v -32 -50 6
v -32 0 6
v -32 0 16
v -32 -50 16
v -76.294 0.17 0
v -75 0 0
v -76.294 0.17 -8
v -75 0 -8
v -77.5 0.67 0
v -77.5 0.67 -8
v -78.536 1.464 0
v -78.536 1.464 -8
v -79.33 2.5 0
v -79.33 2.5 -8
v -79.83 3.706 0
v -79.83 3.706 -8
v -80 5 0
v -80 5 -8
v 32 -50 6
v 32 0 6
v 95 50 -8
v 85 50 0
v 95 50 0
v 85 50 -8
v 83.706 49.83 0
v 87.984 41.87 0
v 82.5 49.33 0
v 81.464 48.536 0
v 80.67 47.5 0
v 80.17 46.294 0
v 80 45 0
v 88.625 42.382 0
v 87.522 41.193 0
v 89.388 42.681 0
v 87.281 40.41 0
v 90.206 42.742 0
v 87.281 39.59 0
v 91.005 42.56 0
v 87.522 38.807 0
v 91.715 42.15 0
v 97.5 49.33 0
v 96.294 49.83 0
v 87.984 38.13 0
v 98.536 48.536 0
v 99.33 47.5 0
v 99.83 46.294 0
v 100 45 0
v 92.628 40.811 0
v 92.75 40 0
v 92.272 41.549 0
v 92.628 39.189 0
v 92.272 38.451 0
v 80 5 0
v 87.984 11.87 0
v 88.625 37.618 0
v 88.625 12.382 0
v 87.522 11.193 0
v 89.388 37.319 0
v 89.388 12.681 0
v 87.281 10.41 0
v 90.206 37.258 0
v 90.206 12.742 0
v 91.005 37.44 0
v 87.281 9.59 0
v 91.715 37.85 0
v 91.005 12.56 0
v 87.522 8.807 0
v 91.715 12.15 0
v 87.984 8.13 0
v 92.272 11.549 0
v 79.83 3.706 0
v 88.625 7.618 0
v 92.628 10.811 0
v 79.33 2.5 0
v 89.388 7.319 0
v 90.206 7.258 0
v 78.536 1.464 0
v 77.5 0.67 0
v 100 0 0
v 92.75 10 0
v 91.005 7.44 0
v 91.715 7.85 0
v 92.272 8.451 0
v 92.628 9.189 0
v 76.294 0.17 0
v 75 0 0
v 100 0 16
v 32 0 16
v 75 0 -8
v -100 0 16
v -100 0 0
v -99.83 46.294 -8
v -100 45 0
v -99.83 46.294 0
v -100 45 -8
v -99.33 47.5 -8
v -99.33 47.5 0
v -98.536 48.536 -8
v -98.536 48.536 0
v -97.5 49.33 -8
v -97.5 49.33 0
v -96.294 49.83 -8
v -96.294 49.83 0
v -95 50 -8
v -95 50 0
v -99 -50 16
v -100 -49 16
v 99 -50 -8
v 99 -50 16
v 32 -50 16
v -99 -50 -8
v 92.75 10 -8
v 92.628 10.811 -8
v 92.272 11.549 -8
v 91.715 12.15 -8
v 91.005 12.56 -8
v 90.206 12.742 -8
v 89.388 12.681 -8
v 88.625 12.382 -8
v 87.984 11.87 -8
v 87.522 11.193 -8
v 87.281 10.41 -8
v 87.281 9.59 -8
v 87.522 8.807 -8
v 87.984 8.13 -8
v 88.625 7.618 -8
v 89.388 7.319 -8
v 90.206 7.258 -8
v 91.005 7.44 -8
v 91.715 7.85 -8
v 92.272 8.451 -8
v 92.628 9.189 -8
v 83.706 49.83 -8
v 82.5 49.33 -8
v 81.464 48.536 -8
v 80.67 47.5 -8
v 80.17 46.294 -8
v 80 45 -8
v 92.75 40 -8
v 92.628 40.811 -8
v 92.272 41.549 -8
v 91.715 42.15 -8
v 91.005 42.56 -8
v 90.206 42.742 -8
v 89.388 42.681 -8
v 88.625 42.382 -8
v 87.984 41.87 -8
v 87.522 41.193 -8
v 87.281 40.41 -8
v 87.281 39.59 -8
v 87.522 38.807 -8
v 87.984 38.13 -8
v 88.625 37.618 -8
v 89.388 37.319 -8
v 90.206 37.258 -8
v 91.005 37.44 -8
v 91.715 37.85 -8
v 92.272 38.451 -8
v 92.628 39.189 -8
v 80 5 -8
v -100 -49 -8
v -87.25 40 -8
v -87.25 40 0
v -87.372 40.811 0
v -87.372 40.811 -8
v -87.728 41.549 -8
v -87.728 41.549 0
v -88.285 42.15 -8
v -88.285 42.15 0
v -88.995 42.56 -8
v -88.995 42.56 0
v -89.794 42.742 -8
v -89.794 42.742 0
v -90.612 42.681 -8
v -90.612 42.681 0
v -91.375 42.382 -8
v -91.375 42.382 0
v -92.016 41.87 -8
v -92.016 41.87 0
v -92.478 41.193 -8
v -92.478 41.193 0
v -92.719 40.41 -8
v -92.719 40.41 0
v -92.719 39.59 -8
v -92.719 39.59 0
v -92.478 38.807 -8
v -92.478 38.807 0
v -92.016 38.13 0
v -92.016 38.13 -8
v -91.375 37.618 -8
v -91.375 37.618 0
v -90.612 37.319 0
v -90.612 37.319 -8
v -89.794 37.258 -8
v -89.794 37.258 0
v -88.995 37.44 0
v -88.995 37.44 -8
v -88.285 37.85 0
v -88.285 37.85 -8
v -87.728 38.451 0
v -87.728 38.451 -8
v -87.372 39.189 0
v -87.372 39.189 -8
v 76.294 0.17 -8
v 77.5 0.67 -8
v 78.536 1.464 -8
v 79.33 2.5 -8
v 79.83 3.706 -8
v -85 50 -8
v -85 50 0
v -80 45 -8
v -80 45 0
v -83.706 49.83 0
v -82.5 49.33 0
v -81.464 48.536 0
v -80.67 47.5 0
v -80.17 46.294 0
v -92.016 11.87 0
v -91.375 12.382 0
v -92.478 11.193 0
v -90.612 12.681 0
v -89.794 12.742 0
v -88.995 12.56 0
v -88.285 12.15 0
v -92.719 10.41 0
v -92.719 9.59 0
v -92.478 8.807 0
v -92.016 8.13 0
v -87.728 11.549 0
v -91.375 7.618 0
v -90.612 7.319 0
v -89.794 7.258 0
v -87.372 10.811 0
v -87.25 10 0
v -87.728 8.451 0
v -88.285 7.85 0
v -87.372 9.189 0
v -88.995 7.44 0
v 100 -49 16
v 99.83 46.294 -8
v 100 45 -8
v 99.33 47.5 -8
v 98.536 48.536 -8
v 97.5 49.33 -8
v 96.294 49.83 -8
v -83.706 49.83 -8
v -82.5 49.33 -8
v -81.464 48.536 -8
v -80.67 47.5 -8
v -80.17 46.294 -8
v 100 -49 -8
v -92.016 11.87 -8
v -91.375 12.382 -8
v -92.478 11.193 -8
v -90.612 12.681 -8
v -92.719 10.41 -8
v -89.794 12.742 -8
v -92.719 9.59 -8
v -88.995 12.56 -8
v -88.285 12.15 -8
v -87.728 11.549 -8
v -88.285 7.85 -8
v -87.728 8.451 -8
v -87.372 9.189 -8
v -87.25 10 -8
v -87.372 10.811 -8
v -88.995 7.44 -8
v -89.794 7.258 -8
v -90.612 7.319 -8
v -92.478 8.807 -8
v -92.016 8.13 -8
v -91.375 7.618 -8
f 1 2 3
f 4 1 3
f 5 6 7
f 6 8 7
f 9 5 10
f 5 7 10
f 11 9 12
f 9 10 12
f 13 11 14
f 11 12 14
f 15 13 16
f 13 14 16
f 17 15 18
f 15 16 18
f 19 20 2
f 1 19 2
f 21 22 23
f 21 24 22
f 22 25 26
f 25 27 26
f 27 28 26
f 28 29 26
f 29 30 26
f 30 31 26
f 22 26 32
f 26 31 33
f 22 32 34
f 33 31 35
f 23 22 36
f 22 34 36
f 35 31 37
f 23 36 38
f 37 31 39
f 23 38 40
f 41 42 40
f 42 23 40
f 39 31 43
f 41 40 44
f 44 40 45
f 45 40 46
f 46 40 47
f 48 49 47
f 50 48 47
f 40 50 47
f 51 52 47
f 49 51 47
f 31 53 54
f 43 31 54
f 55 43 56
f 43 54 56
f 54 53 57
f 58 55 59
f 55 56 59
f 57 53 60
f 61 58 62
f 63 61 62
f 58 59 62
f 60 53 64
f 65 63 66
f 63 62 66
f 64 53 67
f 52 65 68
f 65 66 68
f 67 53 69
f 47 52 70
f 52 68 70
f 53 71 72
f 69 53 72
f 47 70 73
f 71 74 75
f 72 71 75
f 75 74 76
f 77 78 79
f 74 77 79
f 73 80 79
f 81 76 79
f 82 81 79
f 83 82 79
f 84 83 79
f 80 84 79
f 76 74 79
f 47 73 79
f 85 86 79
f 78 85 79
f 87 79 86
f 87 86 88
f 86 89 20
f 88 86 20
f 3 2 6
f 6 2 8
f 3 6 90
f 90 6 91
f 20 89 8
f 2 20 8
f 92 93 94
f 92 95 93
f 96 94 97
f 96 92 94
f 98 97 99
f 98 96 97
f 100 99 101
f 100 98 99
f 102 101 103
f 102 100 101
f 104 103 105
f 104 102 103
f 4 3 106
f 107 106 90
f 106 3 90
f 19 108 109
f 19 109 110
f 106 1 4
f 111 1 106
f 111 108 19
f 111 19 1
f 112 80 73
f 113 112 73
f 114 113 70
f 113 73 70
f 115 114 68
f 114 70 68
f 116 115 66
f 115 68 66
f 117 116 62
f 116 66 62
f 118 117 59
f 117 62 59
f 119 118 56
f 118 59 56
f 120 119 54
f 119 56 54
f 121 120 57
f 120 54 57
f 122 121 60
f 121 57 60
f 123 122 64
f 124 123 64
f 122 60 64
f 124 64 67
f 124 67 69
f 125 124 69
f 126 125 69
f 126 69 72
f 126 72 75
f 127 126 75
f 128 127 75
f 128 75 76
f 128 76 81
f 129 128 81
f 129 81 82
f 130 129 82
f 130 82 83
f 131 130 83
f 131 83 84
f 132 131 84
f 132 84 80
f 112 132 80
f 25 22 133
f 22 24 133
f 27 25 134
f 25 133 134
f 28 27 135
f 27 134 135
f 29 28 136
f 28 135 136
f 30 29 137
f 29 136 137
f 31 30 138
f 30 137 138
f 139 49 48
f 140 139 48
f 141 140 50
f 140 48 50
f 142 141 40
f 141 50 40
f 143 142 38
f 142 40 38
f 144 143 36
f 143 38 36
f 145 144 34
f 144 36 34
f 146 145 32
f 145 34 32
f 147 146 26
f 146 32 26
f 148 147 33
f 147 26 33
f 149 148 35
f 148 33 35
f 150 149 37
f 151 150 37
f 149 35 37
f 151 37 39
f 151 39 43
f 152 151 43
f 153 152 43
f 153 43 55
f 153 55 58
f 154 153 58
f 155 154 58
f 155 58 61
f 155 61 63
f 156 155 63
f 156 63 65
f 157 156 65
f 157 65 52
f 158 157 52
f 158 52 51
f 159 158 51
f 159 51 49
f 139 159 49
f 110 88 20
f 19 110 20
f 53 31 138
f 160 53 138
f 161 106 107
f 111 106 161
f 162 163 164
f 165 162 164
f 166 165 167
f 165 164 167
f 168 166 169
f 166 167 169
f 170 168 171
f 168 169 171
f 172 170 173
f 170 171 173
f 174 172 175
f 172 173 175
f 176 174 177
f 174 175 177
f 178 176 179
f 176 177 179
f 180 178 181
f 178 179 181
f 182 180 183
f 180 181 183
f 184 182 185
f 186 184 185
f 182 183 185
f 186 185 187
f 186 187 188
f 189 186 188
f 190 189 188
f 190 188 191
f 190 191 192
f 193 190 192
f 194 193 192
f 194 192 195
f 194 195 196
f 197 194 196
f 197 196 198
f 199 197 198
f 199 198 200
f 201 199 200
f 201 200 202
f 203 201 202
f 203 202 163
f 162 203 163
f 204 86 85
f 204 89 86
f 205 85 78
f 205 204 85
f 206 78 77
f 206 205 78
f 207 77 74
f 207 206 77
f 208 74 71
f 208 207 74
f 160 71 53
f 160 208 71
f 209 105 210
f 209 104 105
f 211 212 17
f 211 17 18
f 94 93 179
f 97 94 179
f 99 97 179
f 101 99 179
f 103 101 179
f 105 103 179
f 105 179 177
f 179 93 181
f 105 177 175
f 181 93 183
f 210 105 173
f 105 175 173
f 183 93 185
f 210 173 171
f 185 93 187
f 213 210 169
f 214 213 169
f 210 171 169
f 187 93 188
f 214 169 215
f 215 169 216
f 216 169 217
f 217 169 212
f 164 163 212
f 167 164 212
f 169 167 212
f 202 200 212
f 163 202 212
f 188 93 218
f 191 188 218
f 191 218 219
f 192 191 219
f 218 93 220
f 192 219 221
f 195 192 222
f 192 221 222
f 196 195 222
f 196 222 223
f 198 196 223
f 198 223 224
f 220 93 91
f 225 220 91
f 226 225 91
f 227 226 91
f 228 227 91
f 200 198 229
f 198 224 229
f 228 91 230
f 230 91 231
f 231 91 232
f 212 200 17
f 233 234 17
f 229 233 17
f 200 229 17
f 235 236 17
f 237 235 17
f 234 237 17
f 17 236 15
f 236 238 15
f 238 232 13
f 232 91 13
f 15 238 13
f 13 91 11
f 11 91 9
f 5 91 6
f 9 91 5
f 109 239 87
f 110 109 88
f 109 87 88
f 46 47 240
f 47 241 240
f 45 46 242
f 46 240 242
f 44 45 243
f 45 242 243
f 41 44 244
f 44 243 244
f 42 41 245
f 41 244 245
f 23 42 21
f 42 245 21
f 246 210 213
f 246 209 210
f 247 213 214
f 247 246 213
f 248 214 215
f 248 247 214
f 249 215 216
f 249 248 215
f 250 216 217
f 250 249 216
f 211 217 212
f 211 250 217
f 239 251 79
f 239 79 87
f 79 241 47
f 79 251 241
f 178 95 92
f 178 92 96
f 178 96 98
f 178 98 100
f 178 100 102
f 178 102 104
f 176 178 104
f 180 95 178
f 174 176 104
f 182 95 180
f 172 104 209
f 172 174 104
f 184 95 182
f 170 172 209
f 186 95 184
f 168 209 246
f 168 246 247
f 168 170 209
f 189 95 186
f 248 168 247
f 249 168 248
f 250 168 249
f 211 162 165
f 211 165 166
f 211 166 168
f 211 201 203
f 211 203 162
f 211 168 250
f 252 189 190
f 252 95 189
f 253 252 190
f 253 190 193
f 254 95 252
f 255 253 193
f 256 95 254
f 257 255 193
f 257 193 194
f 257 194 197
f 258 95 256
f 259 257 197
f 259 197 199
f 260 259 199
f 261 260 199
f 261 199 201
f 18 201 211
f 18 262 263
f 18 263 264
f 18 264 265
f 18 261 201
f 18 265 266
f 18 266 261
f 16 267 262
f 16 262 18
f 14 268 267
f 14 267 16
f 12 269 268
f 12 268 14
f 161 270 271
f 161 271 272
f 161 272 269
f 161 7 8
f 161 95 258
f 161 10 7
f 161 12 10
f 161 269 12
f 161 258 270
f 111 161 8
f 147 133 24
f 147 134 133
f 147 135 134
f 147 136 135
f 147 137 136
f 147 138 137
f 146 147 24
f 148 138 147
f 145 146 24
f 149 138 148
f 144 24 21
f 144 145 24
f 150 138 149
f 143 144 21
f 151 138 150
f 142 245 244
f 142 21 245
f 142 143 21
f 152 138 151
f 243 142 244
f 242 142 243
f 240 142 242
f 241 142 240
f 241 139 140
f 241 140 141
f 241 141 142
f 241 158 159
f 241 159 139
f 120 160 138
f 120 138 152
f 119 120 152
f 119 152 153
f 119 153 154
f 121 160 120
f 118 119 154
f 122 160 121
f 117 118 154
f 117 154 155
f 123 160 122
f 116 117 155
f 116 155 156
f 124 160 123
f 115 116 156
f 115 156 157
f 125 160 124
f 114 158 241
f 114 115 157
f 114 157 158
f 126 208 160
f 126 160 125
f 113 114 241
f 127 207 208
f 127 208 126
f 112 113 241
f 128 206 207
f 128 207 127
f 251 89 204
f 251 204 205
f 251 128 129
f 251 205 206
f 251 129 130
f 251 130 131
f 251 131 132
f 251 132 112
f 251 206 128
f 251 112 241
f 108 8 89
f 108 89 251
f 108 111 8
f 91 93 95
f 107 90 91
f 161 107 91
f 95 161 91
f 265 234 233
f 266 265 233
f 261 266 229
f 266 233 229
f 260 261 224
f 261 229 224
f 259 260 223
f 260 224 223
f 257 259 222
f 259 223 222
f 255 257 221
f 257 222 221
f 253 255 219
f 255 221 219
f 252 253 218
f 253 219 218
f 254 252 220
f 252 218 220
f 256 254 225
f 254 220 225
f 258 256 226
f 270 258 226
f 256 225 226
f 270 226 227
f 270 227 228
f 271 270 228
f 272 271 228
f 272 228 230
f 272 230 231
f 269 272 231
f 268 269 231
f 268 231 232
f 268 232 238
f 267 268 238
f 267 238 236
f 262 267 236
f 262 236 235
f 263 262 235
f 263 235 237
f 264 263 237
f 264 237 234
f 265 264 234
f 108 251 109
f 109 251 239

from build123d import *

# Parameters (mm, degrees)
BOSS_EXTRUDE1_DEPTH  = 50
SKETCH2_W            = 20
SKETCH2_H            = 8
BOSS_EXTRUDE2_DEPTH  = 50
M5_CLEARANCE_HOLE1_D = 5.5
FILLET1_R            = 5
CHAMFER1_SIZE        = 1


with BuildPart() as part:
    # Sketch1 → Boss-Extrude1 (new body)
    with BuildSketch(Plane(origin=(0, 0, 0), x_dir=(1, 0, 0), z_dir=(0, 1, 0))):
        Polygon((-100, 8), (100, 8), (100, -16), (32, -16), (32, -6), (-32, -6), (-32, -16), (-100, -16), align=None)
    extrude(amount=-BOSS_EXTRUDE1_DEPTH)

    # Sketch2 → Boss-Extrude2 (add)
    with BuildSketch(Plane(origin=(0, 0, 0), x_dir=(1, 0, 0), z_dir=(0, 1, 0))):
        with Locations((-90, 4)):
            Rectangle(SKETCH2_W, SKETCH2_H)
        with Locations((90, 4)):
            Rectangle(SKETCH2_W, SKETCH2_H)
    extrude(amount=BOSS_EXTRUDE2_DEPTH)

    # M5 Clearance Hole1 (through all)
    with Locations(Plane(origin=(0, 0, -8), x_dir=(-1, 0, 0), z_dir=(0, 0, -1))):
        with Locations((-90, 40), (90, 10), (-90, 10), (90, 40)):
            Hole(M5_CLEARANCE_HOLE1_D / 2)

    # Fillet1
    fillet1_edges = [part.edges().sort_by_distance(p)[0] for p in [
        (-80, 0, -4),
        (-100, 50, -4),
        (-80, 50, -4),
        (80, 0, -4),
        (100, 50, -4),
        (80, 50, -4),
    ]]
    fillet(fillet1_edges, radius=FILLET1_R)

    # Chamfer1
    chamfer1_edges = [part.edges().sort_by_distance(p)[0] for p in [
        (100, -50, 4),
        (-100, -50, 4),
    ]]
    chamfer(chamfer1_edges, length=CHAMFER1_SIZE)


solid = part.part
